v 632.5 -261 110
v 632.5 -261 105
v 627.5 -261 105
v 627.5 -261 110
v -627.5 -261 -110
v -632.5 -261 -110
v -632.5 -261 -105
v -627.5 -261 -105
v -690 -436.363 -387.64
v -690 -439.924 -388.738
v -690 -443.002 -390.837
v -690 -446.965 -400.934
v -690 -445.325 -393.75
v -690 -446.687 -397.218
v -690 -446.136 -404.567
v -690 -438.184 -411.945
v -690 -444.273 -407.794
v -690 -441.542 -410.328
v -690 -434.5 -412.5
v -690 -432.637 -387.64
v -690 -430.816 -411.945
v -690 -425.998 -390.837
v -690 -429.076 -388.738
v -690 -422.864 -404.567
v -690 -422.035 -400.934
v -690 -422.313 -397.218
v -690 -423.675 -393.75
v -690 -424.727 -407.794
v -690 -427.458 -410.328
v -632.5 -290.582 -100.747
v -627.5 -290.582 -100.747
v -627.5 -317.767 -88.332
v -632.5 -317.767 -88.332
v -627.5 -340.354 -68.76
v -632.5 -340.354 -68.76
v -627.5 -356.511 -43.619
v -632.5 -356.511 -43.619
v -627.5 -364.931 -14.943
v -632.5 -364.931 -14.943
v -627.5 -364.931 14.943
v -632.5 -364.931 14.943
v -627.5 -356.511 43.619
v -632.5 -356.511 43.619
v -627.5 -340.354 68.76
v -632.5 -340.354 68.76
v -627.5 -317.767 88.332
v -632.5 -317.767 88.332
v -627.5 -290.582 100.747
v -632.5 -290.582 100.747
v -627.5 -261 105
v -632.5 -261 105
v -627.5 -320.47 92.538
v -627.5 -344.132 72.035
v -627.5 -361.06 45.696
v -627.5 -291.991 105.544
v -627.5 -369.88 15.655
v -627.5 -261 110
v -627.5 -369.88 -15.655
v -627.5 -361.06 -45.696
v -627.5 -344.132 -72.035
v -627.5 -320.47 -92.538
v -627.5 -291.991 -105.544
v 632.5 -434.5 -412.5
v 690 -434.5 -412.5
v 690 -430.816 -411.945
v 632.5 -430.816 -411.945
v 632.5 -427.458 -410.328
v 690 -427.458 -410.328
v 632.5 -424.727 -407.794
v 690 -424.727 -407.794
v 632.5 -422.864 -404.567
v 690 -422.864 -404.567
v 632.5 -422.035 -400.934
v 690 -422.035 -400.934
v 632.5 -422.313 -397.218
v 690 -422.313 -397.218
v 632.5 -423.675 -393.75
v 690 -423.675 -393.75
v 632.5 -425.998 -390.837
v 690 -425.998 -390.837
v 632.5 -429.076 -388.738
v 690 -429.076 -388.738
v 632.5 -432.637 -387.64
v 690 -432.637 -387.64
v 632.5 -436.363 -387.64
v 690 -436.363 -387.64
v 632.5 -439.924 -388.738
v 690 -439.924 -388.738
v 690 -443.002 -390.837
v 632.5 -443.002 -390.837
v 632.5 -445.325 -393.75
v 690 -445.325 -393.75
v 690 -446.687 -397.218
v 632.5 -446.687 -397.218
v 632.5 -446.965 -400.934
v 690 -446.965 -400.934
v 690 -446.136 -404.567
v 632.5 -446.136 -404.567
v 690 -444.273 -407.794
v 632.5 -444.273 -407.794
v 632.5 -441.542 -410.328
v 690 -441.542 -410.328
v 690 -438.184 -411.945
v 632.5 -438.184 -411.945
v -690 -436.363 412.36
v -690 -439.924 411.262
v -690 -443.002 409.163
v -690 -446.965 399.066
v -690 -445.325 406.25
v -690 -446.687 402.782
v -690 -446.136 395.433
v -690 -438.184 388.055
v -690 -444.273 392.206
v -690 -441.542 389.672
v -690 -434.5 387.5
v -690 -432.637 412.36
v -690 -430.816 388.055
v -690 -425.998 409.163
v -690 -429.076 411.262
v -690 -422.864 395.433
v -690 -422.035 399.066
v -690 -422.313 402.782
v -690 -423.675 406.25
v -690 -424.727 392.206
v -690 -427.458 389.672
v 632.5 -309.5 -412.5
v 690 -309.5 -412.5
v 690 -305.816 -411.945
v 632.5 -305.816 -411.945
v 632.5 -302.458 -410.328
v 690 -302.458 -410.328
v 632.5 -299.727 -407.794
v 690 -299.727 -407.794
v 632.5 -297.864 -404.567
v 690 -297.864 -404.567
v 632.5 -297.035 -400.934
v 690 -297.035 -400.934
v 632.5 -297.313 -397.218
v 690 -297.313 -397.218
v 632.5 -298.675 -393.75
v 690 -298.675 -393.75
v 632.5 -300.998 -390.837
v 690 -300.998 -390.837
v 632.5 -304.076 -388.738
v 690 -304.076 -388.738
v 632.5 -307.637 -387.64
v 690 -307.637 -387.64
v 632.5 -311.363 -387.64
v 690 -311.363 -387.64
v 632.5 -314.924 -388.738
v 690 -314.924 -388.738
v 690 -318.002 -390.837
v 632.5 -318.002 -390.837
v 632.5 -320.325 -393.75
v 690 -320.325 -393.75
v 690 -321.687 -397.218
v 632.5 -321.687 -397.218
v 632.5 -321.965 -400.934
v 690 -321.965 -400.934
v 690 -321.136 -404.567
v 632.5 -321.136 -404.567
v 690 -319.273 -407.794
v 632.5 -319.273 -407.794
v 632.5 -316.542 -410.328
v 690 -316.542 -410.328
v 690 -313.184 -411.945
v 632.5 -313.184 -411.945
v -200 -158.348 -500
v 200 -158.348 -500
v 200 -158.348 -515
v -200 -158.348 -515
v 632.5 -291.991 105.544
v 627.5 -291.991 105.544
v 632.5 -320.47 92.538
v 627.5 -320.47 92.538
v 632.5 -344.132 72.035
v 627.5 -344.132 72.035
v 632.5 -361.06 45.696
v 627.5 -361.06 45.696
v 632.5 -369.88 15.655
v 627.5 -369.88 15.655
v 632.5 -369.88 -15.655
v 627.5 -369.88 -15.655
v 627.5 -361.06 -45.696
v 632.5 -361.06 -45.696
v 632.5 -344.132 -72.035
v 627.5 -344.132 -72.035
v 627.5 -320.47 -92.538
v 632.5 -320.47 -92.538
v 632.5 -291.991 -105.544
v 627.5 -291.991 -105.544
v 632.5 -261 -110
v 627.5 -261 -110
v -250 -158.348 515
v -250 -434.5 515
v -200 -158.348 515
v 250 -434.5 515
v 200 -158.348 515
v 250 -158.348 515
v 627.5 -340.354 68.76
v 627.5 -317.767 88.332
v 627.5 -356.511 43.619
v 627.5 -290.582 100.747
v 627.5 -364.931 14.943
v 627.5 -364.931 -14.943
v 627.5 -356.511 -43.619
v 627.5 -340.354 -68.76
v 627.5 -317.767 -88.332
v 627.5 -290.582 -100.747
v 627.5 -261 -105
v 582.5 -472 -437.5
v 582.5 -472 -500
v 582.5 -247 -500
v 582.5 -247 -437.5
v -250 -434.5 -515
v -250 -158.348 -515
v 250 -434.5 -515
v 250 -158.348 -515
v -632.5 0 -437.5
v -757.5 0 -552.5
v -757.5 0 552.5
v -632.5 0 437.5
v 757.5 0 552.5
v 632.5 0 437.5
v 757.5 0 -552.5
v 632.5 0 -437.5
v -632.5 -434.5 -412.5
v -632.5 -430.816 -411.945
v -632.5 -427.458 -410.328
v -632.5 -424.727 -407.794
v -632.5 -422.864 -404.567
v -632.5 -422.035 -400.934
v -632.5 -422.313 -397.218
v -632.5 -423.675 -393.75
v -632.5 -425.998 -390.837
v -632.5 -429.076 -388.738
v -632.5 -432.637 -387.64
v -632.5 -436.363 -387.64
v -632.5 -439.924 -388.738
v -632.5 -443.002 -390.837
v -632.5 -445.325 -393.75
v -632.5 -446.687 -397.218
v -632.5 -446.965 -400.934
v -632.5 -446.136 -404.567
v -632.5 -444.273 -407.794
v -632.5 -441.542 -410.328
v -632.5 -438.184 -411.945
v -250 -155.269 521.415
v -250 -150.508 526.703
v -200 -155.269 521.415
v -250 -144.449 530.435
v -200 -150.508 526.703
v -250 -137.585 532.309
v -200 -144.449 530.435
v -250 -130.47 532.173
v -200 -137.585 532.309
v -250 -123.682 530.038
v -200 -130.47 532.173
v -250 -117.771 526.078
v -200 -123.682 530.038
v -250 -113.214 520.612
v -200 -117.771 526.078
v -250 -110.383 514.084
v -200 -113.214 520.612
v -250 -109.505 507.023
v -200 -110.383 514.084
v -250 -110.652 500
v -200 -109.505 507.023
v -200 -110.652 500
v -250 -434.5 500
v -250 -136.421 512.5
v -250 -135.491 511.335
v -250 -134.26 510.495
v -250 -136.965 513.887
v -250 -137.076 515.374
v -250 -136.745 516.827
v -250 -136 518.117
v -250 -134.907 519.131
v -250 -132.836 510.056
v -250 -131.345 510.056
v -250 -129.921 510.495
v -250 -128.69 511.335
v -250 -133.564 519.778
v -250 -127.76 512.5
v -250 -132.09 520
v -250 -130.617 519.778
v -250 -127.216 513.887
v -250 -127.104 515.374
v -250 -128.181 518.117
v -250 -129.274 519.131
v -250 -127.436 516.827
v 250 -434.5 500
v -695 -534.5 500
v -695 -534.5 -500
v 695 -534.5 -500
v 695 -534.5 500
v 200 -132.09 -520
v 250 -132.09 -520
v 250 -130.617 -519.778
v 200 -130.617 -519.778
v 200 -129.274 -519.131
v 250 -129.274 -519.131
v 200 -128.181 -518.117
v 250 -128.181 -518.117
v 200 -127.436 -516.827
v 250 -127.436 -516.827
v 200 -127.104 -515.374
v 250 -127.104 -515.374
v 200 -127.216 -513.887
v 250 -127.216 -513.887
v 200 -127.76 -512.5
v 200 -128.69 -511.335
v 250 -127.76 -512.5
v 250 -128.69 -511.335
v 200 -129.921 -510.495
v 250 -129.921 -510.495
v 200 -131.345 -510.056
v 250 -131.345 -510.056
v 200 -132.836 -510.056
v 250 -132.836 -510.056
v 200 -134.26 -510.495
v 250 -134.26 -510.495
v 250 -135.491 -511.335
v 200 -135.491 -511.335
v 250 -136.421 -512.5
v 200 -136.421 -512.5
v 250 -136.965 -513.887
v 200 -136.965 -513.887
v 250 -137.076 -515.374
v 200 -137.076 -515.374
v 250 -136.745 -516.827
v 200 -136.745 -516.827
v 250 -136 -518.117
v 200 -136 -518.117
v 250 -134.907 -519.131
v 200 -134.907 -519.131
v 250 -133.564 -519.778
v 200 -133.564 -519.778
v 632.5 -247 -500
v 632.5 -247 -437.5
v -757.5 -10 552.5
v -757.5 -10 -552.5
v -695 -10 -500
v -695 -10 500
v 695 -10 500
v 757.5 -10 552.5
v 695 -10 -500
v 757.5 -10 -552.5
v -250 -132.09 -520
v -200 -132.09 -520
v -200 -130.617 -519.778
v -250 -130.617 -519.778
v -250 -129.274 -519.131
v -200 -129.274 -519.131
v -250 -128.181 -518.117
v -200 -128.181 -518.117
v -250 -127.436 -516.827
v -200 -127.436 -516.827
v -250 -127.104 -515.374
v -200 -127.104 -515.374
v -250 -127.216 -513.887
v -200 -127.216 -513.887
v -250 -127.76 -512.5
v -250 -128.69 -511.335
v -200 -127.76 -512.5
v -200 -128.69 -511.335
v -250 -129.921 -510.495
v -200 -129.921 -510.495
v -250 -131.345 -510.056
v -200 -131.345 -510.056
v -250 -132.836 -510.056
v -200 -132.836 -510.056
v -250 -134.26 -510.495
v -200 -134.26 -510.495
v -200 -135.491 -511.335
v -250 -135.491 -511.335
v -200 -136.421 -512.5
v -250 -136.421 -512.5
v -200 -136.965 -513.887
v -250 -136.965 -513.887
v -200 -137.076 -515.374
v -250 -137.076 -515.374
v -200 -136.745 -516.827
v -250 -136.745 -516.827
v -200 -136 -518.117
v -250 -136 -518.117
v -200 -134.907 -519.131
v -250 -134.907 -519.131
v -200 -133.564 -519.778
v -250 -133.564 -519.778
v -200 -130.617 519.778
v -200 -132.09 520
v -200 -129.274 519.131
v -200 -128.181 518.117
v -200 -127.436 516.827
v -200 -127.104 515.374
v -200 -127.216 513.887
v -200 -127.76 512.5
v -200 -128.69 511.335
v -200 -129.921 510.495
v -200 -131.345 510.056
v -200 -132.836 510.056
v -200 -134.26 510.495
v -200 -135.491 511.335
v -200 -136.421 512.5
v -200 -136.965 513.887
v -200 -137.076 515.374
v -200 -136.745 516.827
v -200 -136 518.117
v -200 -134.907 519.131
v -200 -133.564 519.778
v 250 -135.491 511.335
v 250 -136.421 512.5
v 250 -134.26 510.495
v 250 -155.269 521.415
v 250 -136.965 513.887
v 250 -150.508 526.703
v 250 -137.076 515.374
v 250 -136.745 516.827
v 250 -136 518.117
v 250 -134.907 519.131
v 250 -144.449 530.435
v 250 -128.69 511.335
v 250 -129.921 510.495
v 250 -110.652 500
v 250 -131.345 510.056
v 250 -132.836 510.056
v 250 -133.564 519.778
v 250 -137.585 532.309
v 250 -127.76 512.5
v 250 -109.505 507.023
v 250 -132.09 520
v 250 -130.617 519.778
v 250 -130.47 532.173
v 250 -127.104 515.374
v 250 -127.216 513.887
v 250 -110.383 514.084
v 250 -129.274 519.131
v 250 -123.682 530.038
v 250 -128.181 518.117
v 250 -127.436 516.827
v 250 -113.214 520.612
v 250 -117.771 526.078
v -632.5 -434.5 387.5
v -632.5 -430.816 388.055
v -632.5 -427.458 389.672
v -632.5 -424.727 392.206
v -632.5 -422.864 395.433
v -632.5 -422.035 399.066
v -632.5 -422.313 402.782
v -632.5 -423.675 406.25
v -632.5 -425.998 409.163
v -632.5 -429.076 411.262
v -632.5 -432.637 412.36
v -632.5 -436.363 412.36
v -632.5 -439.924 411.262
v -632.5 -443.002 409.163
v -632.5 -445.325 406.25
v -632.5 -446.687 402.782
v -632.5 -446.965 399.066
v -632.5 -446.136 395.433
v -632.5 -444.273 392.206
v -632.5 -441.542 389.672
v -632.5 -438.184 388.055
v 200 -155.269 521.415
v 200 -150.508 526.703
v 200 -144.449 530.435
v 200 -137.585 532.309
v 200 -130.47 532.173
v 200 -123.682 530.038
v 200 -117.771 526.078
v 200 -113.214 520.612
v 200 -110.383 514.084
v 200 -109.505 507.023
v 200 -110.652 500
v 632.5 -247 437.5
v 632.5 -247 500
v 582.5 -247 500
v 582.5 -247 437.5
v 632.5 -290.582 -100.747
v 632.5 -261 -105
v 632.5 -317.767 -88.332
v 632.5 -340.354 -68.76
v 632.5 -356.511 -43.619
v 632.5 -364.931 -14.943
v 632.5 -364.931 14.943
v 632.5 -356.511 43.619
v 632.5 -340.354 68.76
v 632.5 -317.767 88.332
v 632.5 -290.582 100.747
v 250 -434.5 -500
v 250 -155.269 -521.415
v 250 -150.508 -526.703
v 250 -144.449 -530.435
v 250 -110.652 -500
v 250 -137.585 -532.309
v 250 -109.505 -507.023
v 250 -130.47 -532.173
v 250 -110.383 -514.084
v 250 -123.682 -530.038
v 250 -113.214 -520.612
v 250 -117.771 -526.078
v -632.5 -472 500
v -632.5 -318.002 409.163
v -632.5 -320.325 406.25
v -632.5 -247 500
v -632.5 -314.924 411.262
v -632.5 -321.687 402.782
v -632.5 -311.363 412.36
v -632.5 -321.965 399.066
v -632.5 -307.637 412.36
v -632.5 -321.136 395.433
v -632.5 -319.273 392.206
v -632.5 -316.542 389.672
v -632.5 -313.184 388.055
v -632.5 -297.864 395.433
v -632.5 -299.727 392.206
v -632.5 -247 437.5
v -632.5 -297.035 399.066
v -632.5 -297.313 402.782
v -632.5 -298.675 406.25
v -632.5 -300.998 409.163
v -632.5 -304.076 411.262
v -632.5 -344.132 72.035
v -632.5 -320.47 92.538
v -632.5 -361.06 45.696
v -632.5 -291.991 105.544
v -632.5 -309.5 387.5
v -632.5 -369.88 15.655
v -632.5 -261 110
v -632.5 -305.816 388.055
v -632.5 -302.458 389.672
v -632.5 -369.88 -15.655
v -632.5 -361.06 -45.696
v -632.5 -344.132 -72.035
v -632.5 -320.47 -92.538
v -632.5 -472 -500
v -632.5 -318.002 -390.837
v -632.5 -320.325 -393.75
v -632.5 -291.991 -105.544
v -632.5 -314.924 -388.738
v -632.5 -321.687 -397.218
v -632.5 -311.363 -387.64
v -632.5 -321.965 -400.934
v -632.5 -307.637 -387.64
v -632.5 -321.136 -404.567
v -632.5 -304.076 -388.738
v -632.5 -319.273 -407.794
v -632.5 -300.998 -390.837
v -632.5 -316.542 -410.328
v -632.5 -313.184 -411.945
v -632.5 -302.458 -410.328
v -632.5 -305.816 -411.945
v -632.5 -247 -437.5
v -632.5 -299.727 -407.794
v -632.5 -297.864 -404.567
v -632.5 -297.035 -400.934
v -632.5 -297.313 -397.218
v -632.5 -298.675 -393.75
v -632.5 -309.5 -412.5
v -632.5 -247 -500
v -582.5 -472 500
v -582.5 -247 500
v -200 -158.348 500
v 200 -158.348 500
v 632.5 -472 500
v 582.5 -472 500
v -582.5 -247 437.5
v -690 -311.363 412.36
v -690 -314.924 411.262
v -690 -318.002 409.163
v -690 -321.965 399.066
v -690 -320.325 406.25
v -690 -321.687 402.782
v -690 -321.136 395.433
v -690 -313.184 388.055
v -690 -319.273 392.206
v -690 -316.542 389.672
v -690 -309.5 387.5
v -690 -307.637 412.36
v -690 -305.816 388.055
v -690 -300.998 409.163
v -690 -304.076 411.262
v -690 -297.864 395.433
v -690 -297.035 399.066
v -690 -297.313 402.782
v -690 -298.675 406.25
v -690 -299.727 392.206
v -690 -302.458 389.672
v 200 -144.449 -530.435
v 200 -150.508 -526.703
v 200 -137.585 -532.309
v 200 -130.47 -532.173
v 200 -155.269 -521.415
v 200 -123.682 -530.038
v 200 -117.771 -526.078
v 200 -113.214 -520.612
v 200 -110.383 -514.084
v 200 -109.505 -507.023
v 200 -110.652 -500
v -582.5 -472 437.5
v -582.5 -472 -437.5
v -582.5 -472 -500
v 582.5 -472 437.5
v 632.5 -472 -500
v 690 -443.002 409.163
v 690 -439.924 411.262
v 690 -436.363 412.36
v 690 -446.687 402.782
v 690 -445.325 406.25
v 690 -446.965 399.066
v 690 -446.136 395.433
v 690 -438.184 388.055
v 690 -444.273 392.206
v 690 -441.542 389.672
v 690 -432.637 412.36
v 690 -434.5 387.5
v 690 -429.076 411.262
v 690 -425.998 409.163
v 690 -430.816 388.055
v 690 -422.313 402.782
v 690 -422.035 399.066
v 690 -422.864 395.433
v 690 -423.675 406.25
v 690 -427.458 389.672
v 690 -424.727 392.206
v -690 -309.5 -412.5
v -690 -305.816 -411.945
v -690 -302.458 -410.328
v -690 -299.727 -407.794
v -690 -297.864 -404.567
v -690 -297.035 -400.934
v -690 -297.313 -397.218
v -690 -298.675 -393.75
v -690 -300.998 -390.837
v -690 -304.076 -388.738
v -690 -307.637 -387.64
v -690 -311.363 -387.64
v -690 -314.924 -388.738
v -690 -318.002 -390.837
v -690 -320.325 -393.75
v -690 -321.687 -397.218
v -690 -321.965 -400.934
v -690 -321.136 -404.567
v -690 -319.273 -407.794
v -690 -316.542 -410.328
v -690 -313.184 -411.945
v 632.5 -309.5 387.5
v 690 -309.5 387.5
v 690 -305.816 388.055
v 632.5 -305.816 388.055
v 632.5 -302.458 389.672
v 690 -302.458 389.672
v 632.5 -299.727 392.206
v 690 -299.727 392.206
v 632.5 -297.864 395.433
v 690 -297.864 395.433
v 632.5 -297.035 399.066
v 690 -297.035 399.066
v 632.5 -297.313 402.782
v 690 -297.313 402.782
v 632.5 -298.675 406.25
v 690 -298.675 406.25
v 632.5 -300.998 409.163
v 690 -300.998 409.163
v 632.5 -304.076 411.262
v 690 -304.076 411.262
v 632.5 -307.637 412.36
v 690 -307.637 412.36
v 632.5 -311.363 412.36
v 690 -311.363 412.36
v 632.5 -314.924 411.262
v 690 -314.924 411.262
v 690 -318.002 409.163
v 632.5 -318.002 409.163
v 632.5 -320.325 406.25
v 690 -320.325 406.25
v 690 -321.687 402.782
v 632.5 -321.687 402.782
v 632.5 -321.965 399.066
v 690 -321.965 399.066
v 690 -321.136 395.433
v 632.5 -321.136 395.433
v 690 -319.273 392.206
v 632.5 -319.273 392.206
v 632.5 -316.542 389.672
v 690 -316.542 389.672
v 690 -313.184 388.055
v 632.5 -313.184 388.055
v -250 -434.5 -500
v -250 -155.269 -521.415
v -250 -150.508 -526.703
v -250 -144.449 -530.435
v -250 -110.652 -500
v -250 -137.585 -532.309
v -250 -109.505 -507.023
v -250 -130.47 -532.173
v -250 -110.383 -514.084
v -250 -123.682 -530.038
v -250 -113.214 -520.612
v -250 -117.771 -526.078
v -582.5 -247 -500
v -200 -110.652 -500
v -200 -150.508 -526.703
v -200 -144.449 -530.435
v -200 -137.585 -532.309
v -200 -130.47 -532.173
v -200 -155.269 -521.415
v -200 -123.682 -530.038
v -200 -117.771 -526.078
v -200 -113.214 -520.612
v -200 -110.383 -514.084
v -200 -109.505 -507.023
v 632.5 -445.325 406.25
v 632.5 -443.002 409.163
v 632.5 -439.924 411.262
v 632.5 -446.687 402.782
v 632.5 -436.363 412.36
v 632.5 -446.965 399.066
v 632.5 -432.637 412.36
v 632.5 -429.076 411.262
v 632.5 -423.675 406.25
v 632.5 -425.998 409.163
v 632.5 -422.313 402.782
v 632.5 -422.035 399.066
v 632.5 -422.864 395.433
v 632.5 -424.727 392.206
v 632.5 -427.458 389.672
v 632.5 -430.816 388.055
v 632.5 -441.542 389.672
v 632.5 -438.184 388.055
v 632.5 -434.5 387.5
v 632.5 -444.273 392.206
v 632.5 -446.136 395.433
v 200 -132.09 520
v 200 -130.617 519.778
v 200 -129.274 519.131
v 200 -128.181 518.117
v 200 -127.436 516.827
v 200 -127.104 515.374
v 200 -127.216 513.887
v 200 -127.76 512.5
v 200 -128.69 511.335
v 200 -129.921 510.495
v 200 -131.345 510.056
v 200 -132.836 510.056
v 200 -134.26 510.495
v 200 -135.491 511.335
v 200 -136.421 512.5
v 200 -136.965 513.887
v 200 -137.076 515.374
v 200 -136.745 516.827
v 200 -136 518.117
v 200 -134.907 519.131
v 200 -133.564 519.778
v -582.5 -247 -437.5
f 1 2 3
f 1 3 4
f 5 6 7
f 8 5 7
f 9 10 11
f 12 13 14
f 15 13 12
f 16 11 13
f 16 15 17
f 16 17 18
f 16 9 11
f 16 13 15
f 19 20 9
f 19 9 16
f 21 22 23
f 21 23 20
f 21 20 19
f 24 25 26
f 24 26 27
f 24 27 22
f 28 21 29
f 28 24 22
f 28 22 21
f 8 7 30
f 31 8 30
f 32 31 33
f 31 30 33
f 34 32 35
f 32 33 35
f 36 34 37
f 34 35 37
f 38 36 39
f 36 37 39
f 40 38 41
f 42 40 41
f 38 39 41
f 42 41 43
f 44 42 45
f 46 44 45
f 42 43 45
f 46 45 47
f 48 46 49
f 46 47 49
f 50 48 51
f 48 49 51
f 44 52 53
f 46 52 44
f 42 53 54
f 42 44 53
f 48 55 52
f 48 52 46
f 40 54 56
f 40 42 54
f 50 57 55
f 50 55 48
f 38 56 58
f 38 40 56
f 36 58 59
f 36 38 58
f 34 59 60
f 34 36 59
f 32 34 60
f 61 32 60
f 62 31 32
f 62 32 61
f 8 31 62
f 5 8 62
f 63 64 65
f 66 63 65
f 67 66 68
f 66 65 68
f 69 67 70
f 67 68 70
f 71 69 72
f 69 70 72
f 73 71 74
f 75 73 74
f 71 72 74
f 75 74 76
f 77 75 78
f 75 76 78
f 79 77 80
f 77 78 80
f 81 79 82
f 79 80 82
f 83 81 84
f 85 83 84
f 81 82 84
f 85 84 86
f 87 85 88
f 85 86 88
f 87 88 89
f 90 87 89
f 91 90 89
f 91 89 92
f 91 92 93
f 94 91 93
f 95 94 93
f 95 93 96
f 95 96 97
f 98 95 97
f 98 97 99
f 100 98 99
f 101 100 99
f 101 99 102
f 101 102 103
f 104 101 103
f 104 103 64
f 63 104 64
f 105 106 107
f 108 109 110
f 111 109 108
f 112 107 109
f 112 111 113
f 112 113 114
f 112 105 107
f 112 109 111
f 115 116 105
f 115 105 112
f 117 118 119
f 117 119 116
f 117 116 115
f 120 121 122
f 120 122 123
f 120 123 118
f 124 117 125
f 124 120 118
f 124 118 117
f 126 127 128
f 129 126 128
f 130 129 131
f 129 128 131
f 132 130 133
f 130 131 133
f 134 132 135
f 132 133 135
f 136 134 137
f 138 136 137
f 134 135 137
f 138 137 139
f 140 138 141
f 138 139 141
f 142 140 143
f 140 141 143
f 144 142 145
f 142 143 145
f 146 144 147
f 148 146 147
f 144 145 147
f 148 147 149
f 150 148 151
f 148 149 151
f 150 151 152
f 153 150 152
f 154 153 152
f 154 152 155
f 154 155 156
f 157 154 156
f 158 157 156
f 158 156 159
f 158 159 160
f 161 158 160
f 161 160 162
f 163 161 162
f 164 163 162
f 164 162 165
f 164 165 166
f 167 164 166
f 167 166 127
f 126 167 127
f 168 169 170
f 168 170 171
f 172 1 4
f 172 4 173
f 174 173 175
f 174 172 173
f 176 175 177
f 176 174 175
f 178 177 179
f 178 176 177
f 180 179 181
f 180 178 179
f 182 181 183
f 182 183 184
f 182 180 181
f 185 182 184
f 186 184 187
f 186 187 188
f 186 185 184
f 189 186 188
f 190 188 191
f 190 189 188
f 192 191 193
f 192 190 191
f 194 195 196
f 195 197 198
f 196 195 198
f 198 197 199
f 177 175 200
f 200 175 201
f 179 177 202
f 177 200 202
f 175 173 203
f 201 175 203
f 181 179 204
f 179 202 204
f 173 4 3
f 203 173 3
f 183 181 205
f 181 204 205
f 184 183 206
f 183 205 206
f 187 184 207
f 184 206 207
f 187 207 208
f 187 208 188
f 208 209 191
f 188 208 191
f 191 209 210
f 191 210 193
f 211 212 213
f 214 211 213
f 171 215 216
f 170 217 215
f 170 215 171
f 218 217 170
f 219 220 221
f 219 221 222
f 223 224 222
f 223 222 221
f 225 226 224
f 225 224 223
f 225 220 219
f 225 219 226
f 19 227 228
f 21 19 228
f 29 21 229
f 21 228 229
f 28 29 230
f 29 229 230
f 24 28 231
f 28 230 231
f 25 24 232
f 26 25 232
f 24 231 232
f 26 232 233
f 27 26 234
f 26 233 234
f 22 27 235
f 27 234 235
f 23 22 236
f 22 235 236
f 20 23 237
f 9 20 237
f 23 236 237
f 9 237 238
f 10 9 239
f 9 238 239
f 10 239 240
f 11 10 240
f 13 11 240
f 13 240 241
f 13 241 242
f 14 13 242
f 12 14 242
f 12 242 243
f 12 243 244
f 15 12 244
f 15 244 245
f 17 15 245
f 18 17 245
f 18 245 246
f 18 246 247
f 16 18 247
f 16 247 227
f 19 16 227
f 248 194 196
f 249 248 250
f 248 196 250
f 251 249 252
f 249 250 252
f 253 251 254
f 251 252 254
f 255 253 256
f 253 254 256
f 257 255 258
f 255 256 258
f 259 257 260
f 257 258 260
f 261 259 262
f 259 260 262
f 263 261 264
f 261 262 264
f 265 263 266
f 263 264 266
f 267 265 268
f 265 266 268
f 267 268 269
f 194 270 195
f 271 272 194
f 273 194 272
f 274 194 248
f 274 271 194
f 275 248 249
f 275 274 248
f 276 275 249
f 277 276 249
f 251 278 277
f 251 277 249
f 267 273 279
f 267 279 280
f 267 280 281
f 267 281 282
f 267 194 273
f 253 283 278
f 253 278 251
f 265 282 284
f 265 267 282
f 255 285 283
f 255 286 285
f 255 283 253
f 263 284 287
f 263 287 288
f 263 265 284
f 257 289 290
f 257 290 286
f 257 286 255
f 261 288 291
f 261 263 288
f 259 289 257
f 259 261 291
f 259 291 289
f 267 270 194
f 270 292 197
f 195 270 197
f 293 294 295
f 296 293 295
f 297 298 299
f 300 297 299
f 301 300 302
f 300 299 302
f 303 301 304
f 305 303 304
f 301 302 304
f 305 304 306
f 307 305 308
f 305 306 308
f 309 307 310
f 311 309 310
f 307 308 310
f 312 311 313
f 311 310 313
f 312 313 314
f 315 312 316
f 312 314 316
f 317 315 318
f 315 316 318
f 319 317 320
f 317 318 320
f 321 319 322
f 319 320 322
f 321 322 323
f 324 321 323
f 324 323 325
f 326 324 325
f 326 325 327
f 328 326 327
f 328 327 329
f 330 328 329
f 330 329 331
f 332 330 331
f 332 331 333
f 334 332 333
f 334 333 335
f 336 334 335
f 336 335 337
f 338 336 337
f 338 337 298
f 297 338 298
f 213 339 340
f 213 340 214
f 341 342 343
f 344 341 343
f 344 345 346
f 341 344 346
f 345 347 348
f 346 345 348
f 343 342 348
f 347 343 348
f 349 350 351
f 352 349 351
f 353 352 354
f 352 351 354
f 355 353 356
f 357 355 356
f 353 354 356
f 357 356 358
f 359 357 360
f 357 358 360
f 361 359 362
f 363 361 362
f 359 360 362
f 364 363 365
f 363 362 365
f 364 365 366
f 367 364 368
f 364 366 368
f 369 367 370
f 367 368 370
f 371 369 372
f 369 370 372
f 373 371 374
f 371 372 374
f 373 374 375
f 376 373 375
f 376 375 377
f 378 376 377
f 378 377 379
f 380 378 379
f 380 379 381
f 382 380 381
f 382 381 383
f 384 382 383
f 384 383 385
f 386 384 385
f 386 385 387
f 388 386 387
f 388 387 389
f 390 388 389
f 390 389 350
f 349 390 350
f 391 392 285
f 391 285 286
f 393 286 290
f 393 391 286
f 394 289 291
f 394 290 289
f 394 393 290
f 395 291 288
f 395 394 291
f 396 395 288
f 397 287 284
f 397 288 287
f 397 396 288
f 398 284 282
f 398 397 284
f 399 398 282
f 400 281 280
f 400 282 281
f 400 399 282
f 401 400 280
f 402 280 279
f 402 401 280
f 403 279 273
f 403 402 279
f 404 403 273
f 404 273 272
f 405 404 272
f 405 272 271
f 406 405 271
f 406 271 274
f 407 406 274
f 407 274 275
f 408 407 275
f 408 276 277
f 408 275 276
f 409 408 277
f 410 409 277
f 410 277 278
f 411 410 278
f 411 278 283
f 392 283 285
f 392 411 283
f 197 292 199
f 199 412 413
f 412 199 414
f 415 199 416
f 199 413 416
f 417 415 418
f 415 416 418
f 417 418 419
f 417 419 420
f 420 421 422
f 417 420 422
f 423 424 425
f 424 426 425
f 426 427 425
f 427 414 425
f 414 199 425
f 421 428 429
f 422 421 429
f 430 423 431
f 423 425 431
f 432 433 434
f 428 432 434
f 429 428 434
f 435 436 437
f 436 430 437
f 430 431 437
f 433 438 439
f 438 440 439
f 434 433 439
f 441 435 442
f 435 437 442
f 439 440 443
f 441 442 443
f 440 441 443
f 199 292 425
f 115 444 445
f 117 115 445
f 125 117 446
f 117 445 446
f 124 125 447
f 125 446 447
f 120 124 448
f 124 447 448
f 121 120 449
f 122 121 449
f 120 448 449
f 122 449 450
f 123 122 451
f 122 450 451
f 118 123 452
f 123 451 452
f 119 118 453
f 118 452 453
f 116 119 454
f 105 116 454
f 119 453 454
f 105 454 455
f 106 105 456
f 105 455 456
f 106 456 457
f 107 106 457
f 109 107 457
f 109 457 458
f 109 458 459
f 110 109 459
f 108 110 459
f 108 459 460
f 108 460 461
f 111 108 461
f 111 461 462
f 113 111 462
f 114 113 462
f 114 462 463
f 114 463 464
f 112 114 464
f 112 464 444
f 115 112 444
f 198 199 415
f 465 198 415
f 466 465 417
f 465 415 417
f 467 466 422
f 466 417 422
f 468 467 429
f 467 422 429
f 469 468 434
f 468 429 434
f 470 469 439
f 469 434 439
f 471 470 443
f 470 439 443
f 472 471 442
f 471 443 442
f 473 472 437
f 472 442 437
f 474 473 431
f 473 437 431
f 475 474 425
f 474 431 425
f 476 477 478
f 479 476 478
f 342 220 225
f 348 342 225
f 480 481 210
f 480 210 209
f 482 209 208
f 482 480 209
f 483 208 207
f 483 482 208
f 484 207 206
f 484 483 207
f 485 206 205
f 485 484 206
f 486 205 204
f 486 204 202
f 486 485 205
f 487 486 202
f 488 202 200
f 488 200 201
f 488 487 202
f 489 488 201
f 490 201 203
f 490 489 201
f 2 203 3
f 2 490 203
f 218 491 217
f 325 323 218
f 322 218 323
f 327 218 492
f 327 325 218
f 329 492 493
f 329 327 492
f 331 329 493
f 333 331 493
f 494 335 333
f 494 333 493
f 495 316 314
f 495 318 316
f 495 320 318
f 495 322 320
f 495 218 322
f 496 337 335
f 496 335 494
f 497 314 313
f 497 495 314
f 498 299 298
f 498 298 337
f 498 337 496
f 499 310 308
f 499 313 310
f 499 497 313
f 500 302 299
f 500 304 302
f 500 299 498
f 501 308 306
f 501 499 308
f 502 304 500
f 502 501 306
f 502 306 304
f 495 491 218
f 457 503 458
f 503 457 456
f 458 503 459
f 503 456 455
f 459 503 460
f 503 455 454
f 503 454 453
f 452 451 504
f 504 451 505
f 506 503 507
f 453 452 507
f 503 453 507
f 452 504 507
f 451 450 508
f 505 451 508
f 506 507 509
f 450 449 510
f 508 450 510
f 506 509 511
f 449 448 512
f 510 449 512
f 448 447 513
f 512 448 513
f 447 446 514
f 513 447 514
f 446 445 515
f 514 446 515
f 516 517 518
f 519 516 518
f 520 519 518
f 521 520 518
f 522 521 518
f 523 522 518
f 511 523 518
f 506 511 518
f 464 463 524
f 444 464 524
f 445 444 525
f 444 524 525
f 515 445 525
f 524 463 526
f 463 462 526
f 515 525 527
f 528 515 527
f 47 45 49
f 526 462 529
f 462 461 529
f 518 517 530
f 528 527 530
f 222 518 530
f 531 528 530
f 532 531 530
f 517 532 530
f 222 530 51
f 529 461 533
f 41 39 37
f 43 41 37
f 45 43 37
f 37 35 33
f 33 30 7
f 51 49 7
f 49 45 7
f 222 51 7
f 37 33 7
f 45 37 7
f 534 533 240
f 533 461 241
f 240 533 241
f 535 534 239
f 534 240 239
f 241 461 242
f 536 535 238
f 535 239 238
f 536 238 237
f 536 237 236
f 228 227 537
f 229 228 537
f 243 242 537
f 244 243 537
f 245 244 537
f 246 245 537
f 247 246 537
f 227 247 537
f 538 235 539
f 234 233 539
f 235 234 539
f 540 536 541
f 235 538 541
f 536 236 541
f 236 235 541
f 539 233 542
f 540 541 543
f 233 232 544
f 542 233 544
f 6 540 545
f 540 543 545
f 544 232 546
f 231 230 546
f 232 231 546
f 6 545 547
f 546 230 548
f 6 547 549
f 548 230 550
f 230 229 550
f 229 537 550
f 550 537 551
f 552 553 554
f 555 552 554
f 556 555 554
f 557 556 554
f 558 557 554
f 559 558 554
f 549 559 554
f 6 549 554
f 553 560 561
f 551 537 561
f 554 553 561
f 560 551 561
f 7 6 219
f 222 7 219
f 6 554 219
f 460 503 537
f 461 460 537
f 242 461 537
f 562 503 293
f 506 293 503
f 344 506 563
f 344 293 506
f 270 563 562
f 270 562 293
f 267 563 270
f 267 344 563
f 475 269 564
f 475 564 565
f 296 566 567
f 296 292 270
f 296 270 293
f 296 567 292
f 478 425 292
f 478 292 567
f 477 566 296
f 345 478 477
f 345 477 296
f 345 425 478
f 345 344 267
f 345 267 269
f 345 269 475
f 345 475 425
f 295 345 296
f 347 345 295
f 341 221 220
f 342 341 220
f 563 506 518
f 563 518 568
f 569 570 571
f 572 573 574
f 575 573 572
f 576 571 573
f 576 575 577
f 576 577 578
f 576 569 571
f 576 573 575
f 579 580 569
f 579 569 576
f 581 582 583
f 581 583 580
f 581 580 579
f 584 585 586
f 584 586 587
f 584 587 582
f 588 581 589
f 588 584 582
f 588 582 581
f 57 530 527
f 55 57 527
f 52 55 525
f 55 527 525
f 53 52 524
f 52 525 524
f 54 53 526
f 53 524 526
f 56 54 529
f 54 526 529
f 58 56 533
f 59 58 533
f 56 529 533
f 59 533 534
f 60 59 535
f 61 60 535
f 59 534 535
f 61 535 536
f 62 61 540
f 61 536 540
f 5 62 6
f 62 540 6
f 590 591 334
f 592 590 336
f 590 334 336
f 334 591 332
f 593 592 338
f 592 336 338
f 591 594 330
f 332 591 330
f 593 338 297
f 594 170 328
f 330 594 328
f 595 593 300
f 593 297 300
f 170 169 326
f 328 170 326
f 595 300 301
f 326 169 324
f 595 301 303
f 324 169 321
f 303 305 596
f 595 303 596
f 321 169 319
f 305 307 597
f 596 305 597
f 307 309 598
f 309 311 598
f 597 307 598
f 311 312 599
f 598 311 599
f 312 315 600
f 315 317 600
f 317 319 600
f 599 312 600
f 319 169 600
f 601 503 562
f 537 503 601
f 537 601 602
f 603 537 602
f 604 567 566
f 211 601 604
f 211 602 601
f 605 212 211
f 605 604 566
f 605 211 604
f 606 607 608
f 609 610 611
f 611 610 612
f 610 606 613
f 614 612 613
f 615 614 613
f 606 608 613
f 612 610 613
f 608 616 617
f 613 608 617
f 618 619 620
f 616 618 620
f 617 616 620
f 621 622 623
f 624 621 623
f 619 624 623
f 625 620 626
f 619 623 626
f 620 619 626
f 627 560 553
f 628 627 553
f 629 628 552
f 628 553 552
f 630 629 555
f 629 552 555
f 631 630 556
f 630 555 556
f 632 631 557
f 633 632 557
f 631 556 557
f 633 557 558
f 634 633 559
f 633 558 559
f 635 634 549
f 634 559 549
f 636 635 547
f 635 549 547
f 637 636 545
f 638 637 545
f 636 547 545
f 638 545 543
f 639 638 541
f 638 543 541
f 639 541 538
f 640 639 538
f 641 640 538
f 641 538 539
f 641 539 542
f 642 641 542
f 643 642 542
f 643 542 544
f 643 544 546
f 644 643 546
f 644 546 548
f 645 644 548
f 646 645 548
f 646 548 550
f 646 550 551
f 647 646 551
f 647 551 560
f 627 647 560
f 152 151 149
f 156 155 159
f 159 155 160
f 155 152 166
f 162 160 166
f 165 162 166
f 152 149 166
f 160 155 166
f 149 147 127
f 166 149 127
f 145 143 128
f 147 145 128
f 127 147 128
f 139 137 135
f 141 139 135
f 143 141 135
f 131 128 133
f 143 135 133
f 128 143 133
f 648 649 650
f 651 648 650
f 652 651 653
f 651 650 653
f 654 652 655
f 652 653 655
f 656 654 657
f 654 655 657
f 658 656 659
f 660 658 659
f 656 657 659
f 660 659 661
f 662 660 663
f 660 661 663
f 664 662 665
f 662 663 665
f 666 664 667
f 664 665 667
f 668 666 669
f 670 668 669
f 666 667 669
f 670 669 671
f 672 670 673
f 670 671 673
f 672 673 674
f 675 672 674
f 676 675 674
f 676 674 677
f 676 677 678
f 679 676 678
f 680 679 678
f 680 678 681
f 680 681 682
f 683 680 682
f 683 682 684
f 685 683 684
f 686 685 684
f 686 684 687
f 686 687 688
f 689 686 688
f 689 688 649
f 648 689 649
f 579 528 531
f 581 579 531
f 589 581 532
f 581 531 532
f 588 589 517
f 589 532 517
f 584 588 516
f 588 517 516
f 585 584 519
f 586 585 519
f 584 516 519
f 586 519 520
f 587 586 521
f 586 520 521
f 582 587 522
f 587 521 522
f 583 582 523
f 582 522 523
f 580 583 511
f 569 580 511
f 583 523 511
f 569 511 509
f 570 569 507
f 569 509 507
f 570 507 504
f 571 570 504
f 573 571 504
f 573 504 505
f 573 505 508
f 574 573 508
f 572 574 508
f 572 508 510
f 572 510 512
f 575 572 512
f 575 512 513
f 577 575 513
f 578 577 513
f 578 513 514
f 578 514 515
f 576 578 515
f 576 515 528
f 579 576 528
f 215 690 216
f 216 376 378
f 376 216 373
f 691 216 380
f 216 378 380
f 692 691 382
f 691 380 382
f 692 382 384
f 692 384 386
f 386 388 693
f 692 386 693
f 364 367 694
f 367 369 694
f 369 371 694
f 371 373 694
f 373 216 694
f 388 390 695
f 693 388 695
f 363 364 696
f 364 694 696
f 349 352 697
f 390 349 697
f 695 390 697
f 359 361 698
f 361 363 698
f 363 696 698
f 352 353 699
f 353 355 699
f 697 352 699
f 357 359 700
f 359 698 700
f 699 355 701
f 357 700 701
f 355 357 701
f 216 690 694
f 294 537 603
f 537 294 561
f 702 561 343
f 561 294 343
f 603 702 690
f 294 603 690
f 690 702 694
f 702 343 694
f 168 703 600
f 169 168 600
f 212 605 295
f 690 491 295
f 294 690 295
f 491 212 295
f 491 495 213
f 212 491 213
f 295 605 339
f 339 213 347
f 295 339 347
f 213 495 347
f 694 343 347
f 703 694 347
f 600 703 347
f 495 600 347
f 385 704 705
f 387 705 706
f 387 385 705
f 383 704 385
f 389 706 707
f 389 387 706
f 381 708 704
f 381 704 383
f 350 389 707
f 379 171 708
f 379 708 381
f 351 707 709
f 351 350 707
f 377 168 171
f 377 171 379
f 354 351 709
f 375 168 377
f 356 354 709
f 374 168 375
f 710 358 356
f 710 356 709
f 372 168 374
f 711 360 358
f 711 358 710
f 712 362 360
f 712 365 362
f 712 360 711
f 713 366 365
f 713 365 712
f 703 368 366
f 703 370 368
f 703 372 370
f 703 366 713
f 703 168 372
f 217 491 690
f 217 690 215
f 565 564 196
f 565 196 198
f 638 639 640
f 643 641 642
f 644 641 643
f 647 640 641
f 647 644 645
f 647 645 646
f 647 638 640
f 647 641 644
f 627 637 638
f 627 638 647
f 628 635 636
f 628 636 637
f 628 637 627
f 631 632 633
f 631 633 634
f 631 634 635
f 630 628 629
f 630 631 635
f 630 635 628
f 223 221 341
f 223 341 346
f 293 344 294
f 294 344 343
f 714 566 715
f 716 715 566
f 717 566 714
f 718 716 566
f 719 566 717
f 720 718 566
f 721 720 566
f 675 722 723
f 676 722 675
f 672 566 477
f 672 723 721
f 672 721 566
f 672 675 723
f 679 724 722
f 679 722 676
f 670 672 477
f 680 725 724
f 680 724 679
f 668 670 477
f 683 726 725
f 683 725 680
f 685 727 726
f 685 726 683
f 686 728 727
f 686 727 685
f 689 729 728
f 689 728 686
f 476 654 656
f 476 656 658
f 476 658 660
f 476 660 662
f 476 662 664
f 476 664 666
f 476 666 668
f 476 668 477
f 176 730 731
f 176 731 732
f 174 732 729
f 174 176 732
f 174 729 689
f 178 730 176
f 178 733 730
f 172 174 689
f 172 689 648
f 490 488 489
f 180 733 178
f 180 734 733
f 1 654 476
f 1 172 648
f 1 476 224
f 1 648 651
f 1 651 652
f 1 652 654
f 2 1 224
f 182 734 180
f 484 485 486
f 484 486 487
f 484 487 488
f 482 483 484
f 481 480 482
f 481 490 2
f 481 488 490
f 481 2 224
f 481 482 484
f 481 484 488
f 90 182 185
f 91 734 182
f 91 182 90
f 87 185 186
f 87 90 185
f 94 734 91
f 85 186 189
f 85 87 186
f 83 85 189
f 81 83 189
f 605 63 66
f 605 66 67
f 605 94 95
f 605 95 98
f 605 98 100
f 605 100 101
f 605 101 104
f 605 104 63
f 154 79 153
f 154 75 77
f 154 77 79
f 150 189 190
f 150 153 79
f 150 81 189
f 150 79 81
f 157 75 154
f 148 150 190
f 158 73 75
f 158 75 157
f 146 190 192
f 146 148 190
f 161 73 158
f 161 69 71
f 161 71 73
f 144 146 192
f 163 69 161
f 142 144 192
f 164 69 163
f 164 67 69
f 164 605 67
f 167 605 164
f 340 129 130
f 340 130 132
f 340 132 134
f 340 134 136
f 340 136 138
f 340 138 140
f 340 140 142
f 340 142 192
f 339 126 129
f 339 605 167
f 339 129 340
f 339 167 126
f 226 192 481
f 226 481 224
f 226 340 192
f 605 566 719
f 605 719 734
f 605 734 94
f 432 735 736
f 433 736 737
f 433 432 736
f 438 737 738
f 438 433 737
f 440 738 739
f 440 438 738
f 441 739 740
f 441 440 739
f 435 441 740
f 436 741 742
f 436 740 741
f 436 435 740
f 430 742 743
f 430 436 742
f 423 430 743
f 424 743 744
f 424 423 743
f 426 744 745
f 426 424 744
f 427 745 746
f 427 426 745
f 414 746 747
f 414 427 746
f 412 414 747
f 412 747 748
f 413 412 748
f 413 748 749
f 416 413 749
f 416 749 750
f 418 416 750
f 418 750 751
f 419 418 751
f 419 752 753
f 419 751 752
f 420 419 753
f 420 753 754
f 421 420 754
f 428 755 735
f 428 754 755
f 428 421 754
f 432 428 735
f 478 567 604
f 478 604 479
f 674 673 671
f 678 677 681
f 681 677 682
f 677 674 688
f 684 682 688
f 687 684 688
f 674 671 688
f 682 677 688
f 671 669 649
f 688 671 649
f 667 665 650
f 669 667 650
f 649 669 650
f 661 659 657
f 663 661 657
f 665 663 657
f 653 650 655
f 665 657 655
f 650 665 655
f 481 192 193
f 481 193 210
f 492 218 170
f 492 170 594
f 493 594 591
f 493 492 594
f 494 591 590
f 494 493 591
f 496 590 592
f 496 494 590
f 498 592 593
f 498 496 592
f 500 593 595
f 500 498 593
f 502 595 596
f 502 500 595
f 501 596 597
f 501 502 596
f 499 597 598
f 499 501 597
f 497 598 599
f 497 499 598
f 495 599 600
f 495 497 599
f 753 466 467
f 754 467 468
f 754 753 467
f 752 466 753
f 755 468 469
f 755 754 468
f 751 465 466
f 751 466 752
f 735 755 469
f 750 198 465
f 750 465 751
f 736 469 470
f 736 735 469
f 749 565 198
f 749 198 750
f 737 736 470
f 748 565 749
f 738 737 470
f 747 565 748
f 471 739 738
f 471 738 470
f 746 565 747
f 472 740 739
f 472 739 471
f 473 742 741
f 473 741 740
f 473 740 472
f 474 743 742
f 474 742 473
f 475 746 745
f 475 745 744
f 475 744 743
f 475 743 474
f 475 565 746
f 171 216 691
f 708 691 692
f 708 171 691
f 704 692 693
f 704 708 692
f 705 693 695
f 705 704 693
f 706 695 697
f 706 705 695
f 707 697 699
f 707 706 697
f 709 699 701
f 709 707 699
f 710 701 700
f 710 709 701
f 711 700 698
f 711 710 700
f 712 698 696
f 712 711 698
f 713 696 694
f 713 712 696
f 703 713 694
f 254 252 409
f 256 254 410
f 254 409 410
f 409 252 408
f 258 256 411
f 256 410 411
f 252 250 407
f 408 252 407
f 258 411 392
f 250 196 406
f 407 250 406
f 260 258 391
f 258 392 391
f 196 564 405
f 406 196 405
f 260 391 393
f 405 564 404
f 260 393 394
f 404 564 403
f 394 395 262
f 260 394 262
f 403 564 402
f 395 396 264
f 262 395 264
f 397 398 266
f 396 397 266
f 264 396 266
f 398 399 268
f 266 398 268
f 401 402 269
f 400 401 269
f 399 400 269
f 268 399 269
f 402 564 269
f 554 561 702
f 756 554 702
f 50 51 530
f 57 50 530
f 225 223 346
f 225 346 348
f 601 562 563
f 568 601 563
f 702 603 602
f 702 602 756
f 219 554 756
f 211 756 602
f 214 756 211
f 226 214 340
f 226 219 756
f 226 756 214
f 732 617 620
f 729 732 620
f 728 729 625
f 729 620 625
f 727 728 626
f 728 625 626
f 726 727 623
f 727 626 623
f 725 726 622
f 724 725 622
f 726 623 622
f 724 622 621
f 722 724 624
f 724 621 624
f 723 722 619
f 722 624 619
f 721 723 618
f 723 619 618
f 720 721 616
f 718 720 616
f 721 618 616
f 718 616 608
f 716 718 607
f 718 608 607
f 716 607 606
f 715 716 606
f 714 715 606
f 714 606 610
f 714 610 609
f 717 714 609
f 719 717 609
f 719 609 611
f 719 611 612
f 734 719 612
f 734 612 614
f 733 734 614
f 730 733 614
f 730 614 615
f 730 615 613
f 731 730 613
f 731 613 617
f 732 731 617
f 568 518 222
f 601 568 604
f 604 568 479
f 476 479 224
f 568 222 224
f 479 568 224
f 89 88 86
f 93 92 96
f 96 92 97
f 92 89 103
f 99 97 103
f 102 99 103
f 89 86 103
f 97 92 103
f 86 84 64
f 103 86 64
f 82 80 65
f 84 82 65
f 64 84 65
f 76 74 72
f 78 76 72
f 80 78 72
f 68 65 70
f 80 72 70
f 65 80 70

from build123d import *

# Parameters (mm, degrees)
SKETCH2_W                   = 1390
SKETCH2_H                   = 1000
SKETCH2_W_2                 = 1265
SKETCH2_H_2                 = 875
BOSS_EXTRUDE1_DEPTH         = 534.5
SKETCH3_W                   = 1390
SKETCH3_H                   = 1000
BOSS_EXTRUDE2_DEPTH         = 62.5
MMRTG_START                 = -62.5
MMRTG_HOLDER_DEPTH          = 5
SKETCH5_R                   = 12.5
SUSPENSION_BOLT_HOLES_DEPTH = 1571.920192117
CONTROL_ARM_CUTOUT_REACH    = 1331.931
SKETCH6_W                   = 50
SKETCH6_H                   = 225
MIRROR3_COPY_1_REACH        = 1331.931
MIRROR3_COPY_1_SKETCH_W     = 50
MIRROR3_COPY_1_SKETCH_H     = 225
SKETCH7_W                   = 1515
SKETCH7_H                   = 1105
SKETCH7_W_2                 = 1265
SKETCH7_H_2                 = 875
ATTACHROVERFLANGE_DEPTH     = 10
SKETCH11_R                  = 12.5
BOSS_EXTRUDE3_DEPTH         = 5
SKETCH13_R                  = 25
SKETCH13_W                  = 15
SKETCH13_H                  = 300
BOSS_EXTRUDE4_DEPTH         = 250
CUT_EXTRUDE1_DEPTH          = 250
CUT_EXTRUDE1_DEPTH_BACK     = 15
SKETCH14_W                  = 400
SKETCH14_H                  = 55.53291541
CUT_EXTRUDE2_REACH          = 1269.282
SKETCH15_R                  = 5
SKETCH16_W                  = 400
SKETCH16_H                  = 66.742444313
CUT_EXTRUDE3_DEPTH          = 607


with BuildPart() as part:
    # Sketch2 → Boss-Extrude1 (new body)
    with BuildSketch(Plane(origin=(0, 0, 0), x_dir=(1, 0, 0), z_dir=(0, 1, 0))):
        Rectangle(SKETCH2_W, SKETCH2_H)
        Rectangle(SKETCH2_W_2, SKETCH2_H_2, mode=Mode.SUBTRACT)
    extrude(amount=-BOSS_EXTRUDE1_DEPTH)

    # Sketch3 → Boss-Extrude2 (add)
    with BuildSketch(Plane.XZ.offset(534.5)):
        Rectangle(SKETCH3_W, SKETCH3_H)
    extrude(amount=-BOSS_EXTRUDE2_DEPTH)

    # Sketch4 → MMRTG Holder (add)
    with BuildSketch(Plane(origin=(695, 0, 0), x_dir=(0, 0, -1), z_dir=(1, 0, 0)).offset(MMRTG_START)):
        with BuildLine():
            Line((-105, -261), (-110, -261))
            ThreePointArc((-110, -261), (0, -371), (110, -261))
            Line((110, -261), (105, -261))
            ThreePointArc((105, -261), (0, -366), (-105, -261))
        make_face()
    mmrtg_holder = extrude(amount=-MMRTG_HOLDER_DEPTH)

    # Mirror1: MMRTG Holder across plane
    add(mmrtg_holder.mirror(Plane(origin=(0, 0, 0), x_dir=(0, 0, 1), z_dir=(1, 0, 0))))

    # Sketch5 → Suspension Bolt Holes (cut, through all)
    with BuildSketch(Plane(origin=(695, 0, 0), x_dir=(0, 0, -1), z_dir=(1, 0, 0))):
        with Locations((-400, -309.5)):
            Circle(SKETCH5_R)
        with Locations((-400, -434.5)):
            Circle(SKETCH5_R)
        with Locations((400, -434.5)):
            Circle(SKETCH5_R)
        with Locations((400, -309.5)):
            Circle(SKETCH5_R)
    extrude(amount=-SUSPENSION_BOLT_HOLES_DEPTH, mode=Mode.SUBTRACT)

    # Sketch6 → Control Arm Cutout (cut, up to next)
    with BuildSketch(Plane(origin=(0, 0, -500), x_dir=(-1, 0, 0), z_dir=(0, 0, -1)), mode=Mode.PRIVATE) as control_arm_cutout_sk1:
        with Locations((-607.5, -359.5)):
            Rectangle(SKETCH6_W, SKETCH6_H)
    control_arm_cutout_tool1 = extrude(control_arm_cutout_sk1.sketch, amount=-CONTROL_ARM_CUTOUT_REACH, mode=Mode.PRIVATE) & part.part
    control_arm_cutout = control_arm_cutout_tool1.solids().sort_by_distance((607.5, -359.5, -500))[0]
    add(control_arm_cutout, mode=Mode.SUBTRACT)

    # Mirror2: Control Arm Cutout across plane
    add(control_arm_cutout.mirror(Plane(origin=(0, 0, 0), x_dir=(0, 0, 1), z_dir=(1, 0, 0))), mode=Mode.SUBTRACT)

    # Mirror3: Control Arm Cutout across plane
    add(control_arm_cutout.mirror(Plane.XY), mode=Mode.SUBTRACT)

    # Mirror3 copy 1 sketch → Mirror3 copy 1 (cut, up to next)
    with BuildSketch(Plane.XY.offset(500), mode=Mode.PRIVATE) as mirror3_copy_1_sk1:
        with Locations((-607.5, -359.5)):
            Rectangle(MIRROR3_COPY_1_SKETCH_W, MIRROR3_COPY_1_SKETCH_H)
    mirror3_copy_1_tool1 = extrude(mirror3_copy_1_sk1.sketch, amount=-MIRROR3_COPY_1_REACH, mode=Mode.PRIVATE) & part.part
    add(mirror3_copy_1_tool1.solids().sort_by_distance((-607.5, -359.5, 500))[0], mode=Mode.SUBTRACT)

    # Sketch7 → AttachRoverFlange (add)
    with BuildSketch(Plane(origin=(0, 0, 0), x_dir=(1, 0, 0), z_dir=(0, 1, 0))):
        Rectangle(SKETCH7_W, SKETCH7_H)
        Rectangle(SKETCH7_W_2, SKETCH7_H_2, mode=Mode.SUBTRACT)
    extrude(amount=-ATTACHROVERFLANGE_DEPTH)

    # Sketch11 → Boss-Extrude3 (add)
    with BuildSketch(Plane(origin=(695, 0, 0), x_dir=(0, 0, -1), z_dir=(1, 0, 0))):
        with Locations((-400, -309.5)):
            Circle(SKETCH11_R)
        with Locations((-400, -434.5)):
            Circle(SKETCH11_R)
        with Locations((400, -309.5)):
            Circle(SKETCH11_R)
        with Locations((400, -434.5)):
            Circle(SKETCH11_R)
    boss_extrude3 = extrude(amount=-BOSS_EXTRUDE3_DEPTH)

    # Mirror4: Boss-Extrude3 across plane
    add(boss_extrude3.mirror(Plane(origin=(0, 0, 0), x_dir=(0, 0, 1), z_dir=(1, 0, 0))))

    # Sketch13 → Boss-Extrude4 (add, symmetric)
    with BuildSketch(Plane(origin=(0, 0, 0), x_dir=(0, 0, -1), z_dir=(1, 0, 0))):
        with Locations((507.5, -134.5)):
            Circle(SKETCH13_R)
        with Locations((507.5, -284.5)):
            Rectangle(SKETCH13_W, SKETCH13_H)
    boss_extrude4 = extrude(amount=BOSS_EXTRUDE4_DEPTH, both=True)

    # Sketch14 → Cut-Extrude1 (cut, two sides: drawn at the far end of the back side and taken through both)
    with BuildSketch(Plane(origin=(0, 0, -515), x_dir=(-1, 0, 0), z_dir=(0, 0, -1)).offset(-CUT_EXTRUDE1_DEPTH_BACK)):
        with Locations((0, -130.58202233)):
            Rectangle(SKETCH14_W, SKETCH14_H)
    extrude(amount=CUT_EXTRUDE1_DEPTH + CUT_EXTRUDE1_DEPTH_BACK, mode=Mode.SUBTRACT)

    # Cut-Extrude2: up to this face of the body (flat: up to its plane)
    cut_extrude2_end = Plane(part.part.faces().sort_by_distance((-695, -272.25, 0))[0])
    # Sketch15 → Cut-Extrude2 (cut, up to the picked face)
    with BuildSketch(Plane(origin=(250, 0, 0), x_dir=(0, 0, -1), z_dir=(1, 0, 0)), mode=Mode.PRIVATE) as cut_extrude2_sk1:
        with Locations((515, -132.090441405)):
            Circle(SKETCH15_R)
    cut_extrude2_tool1 = split(extrude(cut_extrude2_sk1.sketch, amount=-CUT_EXTRUDE2_REACH, mode=Mode.PRIVATE), bisect_by=cut_extrude2_end, keep=Keep.BOTH, mode=Mode.PRIVATE)
    cut_extrude2 = cut_extrude2_tool1.solids().sort_by(Axis((250, -132.090441, -515), (-1, 0, 0)))[0]
    add(cut_extrude2, mode=Mode.SUBTRACT)

    # Mirror6: Boss-Extrude4, Cut-Extrude2 across plane
    add(boss_extrude4.mirror(Plane.XY))
    add(cut_extrude2.mirror(Plane.XY), mode=Mode.SUBTRACT)

    # Sketch16 → Cut-Extrude3 (cut)
    with BuildSketch(Plane.XY.offset(500)):
        with Locations((0, -124.977257879)):
            Rectangle(SKETCH16_W, SKETCH16_H)
    extrude(amount=CUT_EXTRUDE3_DEPTH, mode=Mode.SUBTRACT)


solid = part.part
